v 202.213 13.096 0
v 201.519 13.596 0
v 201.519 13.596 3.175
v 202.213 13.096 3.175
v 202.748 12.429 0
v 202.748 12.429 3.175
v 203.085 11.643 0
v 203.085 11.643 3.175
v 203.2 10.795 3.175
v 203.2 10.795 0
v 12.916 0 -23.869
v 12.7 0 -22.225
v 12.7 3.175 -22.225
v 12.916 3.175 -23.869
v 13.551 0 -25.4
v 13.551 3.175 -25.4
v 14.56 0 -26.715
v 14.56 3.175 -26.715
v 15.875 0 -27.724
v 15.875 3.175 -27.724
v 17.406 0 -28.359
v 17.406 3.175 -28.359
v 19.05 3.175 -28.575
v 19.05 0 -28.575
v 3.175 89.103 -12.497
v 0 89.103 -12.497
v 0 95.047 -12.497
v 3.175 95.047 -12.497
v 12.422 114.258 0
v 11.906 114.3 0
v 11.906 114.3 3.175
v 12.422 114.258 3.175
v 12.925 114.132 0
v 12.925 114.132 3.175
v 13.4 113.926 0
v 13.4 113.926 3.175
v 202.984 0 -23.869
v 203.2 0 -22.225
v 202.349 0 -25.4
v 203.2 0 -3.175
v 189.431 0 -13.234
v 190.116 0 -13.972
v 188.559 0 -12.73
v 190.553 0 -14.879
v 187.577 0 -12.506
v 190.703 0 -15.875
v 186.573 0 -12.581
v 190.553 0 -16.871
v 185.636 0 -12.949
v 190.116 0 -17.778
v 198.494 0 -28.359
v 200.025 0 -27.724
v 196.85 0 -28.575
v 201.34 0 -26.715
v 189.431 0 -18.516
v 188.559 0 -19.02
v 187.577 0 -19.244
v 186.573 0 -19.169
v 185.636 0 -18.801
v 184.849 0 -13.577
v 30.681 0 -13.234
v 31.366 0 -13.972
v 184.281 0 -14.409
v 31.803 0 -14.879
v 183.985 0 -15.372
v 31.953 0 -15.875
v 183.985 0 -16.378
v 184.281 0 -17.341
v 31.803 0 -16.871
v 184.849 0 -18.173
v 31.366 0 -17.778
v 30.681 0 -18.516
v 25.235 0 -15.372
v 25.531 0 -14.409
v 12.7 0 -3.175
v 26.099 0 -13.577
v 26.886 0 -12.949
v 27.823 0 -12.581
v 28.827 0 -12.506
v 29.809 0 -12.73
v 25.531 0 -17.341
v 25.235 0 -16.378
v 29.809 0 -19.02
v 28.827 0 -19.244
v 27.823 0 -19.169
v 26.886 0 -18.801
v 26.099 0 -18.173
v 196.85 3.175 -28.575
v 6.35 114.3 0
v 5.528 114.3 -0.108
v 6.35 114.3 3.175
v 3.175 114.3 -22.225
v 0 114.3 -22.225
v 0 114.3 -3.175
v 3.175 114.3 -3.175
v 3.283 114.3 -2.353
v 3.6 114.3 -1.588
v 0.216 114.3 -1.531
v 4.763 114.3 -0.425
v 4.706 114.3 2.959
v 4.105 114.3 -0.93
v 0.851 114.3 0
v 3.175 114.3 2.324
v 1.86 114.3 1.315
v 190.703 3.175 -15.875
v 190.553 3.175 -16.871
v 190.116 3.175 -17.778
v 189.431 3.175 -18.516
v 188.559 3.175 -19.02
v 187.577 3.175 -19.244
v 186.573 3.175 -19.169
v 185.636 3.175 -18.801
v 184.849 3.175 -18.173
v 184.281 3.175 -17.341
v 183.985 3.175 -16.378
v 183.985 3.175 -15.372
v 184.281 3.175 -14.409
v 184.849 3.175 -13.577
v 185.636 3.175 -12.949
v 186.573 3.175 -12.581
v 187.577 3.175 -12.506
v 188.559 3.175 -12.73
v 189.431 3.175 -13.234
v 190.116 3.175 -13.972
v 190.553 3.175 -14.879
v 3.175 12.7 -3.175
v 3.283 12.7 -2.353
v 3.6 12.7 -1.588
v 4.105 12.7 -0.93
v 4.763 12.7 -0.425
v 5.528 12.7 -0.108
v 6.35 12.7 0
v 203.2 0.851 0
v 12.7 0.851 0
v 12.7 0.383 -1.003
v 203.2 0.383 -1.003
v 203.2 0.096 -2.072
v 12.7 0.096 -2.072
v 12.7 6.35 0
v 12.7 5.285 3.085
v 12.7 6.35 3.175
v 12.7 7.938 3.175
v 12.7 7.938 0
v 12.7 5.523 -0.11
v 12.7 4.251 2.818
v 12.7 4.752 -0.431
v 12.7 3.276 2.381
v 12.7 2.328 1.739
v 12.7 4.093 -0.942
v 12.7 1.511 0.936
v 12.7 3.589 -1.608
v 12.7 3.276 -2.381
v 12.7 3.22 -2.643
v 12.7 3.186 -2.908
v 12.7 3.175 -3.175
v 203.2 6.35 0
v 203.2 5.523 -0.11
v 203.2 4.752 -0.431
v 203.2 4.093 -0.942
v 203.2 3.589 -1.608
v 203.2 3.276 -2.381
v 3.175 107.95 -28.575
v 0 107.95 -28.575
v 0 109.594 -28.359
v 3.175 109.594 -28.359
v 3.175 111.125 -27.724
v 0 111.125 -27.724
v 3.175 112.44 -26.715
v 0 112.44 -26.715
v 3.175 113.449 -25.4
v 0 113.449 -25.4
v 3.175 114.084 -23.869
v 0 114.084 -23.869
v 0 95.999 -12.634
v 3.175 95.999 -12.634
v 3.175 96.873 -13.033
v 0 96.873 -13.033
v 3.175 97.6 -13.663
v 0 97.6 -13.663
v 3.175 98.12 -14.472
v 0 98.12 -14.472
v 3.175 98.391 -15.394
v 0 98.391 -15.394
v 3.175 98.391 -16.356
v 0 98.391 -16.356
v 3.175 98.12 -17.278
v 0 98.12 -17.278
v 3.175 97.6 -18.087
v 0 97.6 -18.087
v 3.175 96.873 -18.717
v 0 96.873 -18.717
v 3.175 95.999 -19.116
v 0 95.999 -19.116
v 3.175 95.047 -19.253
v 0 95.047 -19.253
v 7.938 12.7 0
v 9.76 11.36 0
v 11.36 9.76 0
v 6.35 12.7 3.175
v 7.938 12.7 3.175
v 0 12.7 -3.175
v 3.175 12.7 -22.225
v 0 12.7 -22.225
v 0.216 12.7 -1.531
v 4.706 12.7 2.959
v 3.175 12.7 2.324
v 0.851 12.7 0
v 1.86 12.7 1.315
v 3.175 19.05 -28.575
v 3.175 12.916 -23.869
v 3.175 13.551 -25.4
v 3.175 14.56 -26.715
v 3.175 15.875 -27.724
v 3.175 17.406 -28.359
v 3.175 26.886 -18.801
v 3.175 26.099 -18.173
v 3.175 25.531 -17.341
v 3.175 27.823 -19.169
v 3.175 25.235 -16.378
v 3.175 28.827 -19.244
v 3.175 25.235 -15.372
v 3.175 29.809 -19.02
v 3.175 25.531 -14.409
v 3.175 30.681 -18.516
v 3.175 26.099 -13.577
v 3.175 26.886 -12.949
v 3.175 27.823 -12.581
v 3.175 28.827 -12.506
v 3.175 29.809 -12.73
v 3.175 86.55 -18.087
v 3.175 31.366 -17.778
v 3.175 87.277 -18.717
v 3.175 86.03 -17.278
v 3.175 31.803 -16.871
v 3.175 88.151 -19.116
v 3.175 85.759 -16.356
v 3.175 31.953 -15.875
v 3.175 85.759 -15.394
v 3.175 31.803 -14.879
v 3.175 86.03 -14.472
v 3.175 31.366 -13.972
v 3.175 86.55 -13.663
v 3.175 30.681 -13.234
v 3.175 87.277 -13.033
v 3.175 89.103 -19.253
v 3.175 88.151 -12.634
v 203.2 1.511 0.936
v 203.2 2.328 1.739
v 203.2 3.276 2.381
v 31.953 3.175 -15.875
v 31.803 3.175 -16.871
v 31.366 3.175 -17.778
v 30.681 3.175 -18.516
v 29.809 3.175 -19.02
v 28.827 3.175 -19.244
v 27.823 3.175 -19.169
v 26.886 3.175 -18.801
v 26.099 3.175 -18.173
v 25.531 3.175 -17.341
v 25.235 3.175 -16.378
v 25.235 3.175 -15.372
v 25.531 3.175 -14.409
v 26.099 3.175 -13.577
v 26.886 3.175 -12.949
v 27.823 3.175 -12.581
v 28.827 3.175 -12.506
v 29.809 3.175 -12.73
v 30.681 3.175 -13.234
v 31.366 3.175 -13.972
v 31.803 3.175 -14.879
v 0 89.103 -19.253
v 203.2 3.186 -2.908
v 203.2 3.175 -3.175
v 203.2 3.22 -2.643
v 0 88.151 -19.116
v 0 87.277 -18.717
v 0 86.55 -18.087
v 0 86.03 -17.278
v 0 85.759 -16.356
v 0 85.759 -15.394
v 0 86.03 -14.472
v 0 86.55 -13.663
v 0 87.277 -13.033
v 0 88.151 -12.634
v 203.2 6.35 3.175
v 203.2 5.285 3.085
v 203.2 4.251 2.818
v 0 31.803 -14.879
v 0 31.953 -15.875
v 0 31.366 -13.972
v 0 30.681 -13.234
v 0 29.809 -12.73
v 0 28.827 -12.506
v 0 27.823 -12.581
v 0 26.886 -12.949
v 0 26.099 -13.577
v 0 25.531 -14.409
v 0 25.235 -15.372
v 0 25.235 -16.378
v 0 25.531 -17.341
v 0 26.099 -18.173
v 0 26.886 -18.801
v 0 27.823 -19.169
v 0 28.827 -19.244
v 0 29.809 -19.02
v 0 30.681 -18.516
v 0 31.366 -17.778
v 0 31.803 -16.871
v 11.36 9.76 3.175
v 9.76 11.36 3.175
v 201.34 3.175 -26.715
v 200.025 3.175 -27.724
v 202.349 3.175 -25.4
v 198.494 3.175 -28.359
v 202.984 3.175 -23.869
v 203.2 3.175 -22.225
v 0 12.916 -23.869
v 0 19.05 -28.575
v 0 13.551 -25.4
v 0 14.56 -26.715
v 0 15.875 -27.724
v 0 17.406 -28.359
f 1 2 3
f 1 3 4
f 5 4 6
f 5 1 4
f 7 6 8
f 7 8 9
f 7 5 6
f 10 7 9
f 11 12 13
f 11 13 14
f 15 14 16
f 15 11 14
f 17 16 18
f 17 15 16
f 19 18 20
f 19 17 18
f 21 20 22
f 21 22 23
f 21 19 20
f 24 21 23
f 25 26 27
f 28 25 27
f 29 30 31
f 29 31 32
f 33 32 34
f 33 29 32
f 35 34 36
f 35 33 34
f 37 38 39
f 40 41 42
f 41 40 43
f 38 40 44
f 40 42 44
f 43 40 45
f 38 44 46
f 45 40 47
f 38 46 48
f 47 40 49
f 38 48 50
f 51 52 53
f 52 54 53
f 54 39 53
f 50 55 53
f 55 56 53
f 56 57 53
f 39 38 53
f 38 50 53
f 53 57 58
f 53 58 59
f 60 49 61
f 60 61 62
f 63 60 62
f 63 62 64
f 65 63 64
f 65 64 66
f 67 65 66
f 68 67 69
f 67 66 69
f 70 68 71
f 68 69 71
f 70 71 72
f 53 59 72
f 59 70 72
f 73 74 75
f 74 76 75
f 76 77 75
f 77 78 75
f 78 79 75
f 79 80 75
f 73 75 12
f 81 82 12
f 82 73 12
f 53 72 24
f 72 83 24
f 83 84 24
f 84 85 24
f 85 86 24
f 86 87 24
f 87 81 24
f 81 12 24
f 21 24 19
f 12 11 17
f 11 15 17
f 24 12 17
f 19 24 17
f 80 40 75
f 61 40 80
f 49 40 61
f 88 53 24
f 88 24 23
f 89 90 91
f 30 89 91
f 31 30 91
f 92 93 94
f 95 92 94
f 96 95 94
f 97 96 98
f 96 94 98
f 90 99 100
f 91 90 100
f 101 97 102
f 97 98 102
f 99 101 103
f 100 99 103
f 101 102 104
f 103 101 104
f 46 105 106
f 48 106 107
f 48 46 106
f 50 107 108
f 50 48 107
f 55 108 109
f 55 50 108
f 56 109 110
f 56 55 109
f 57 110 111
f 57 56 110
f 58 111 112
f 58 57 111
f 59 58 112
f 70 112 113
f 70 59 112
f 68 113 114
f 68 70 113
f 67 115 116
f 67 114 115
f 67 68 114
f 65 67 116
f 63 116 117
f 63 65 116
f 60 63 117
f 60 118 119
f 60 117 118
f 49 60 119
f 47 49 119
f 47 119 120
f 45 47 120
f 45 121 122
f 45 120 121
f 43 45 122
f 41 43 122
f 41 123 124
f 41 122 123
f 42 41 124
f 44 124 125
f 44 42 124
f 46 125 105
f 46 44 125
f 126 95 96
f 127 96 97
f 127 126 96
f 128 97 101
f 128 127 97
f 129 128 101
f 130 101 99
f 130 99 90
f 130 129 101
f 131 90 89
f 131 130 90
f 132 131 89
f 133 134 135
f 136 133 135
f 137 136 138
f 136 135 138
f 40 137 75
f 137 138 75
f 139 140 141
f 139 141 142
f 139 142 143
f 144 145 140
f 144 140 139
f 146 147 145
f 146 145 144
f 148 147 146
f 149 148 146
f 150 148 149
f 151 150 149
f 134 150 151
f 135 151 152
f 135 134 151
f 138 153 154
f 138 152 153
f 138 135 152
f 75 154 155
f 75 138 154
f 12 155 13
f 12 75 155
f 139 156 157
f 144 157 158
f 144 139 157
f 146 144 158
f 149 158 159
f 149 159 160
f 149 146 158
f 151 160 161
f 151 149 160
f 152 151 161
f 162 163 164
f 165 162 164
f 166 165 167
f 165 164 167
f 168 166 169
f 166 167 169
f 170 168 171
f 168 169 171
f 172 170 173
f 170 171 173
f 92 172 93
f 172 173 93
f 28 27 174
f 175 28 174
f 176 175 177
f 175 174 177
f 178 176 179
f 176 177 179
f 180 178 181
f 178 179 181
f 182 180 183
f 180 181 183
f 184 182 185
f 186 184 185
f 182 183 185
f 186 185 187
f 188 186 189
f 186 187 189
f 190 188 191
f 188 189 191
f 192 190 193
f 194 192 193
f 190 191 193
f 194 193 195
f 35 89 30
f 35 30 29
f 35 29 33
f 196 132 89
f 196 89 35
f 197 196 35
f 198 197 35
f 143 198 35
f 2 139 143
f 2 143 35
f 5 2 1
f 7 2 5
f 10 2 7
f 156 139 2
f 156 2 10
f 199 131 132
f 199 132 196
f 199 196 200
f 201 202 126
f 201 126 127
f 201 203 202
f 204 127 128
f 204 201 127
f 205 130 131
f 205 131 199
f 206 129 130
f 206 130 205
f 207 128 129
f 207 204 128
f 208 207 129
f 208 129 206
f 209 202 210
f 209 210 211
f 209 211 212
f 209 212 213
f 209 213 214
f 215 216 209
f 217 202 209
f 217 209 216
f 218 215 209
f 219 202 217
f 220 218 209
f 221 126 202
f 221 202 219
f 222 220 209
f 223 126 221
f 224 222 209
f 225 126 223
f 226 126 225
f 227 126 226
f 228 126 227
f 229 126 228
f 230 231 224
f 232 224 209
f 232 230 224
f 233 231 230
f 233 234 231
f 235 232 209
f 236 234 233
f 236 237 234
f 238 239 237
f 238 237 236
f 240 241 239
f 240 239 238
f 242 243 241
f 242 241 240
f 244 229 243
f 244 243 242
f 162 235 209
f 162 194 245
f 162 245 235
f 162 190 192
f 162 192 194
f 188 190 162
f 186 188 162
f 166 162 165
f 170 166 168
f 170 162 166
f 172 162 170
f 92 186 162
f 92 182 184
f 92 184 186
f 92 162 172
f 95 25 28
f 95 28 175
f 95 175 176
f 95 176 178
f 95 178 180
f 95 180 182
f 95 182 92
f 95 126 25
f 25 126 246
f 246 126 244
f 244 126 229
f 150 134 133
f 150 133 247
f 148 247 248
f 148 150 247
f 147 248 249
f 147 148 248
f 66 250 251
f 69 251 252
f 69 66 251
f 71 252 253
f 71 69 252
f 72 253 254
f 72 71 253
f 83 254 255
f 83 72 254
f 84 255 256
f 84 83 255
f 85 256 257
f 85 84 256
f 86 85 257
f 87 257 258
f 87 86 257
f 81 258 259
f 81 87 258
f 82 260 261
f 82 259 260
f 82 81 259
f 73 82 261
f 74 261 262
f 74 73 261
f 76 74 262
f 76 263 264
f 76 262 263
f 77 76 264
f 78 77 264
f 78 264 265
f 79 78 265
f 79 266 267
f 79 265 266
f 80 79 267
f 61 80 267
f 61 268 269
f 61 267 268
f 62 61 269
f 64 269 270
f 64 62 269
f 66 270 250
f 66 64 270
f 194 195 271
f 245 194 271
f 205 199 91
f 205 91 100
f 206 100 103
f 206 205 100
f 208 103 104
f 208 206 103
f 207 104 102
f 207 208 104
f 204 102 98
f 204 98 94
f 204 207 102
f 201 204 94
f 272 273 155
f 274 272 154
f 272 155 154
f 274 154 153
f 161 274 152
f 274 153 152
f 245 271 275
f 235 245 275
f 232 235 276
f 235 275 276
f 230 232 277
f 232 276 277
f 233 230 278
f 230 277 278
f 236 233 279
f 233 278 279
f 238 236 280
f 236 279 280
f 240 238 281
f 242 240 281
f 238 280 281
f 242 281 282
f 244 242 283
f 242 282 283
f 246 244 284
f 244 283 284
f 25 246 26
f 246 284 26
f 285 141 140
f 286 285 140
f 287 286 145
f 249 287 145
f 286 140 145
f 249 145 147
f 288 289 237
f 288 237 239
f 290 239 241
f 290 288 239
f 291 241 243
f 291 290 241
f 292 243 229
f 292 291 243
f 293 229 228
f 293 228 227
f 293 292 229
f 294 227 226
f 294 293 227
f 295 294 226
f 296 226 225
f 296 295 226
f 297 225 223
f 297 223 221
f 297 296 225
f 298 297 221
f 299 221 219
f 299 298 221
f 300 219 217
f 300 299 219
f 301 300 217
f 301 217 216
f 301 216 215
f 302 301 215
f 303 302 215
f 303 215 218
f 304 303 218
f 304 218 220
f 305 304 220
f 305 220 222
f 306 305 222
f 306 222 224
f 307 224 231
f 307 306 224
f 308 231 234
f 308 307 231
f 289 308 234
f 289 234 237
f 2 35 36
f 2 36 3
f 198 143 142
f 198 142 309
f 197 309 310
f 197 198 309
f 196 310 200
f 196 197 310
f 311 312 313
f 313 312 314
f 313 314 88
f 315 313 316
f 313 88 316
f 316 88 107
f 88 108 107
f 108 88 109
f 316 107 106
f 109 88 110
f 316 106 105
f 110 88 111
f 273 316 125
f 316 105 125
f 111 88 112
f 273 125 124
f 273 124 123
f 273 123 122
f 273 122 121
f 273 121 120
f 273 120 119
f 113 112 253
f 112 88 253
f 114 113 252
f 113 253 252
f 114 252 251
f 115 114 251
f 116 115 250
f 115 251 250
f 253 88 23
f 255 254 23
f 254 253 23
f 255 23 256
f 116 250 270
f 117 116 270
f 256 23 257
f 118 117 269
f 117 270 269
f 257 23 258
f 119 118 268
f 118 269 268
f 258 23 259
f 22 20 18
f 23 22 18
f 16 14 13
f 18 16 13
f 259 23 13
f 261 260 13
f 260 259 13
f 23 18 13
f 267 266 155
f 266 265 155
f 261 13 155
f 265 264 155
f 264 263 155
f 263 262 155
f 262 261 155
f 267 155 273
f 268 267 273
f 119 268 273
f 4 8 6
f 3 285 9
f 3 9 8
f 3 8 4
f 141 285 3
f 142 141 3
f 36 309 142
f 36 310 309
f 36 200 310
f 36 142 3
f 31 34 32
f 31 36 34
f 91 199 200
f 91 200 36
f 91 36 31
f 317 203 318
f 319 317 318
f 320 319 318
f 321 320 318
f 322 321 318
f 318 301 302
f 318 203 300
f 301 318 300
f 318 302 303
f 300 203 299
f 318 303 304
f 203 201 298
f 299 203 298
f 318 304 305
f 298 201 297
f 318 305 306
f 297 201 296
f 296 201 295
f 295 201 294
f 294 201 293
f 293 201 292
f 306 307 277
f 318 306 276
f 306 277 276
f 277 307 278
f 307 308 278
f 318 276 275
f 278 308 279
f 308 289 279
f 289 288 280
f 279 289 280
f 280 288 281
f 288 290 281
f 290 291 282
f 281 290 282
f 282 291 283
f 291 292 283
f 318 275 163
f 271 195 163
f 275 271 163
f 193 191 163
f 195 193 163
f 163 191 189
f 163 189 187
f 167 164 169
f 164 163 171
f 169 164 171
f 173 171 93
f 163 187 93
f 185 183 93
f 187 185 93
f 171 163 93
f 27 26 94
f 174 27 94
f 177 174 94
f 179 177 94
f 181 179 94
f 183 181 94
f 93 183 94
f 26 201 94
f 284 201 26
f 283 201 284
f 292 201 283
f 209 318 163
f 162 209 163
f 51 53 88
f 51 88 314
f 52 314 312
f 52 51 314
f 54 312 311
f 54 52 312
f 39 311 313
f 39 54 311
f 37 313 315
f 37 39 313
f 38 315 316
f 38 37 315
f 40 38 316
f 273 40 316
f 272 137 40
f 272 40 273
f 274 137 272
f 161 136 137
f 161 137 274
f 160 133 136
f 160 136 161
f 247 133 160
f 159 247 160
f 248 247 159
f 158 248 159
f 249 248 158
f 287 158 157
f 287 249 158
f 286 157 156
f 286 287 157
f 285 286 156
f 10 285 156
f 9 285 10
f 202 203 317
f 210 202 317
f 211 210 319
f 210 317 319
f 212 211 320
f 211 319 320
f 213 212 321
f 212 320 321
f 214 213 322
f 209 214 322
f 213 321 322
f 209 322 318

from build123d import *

# Parameters (mm, degrees)
BASE_FLANGE1_DEPTH                = 3.175
EDGE_FLANGE2_STRIP_W              = 19.05
EDGE_FLANGE2_STRIP_H              = 3.175
EDGE_FLANGE2_STRIP_CUT_DEPTH      = 190.5
EDGE_FLANGE2_RELIEF_W             = 20.6375
EDGE_FLANGE2_RELIEF_H             = 1.5875
EDGE_FLANGE2_RELIEF_CUT_DEPTH     = 3.175
EDGE_FLANGE2_STRIP_2_W            = 19.05
EDGE_FLANGE2_STRIP_2_H            = 3.175
EDGE_FLANGE2_STRIP_CUT_2_DEPTH    = 101.6
EDGE_FLANGE2_RELIEF_2_W           = 20.6375
EDGE_FLANGE2_RELIEF_2_H           = 1.5875
EDGE_FLANGE2_RELIEF_CUT_2_DEPTH   = 3.175
EDGE_FLANGE2_DEPTH                = 190.5
EDGE_FLANGE2_BEND_DEPTH           = 101.6
F_1_4_CLEARANCE_HOLE1_D           = 6.7564
F_1_4_CLEARANCE_HOLE1_ON_FACE_2_D = 6.7564
CUT_EXTRUDE1_DEPTH                = 235.885633075
FILLET1_R                         = 3.175
FILLET2_R                         = 6.35
F_1_4_START                       = -1
F_1_4_CLEARANCE_SLOT1_DEPTH       = 5
BODY_MOVE_COPY1_OUTLINE_R         = 3.3782
BODY_MOVE_COPY1_DEPTH             = 203.2
BODY_MOVE_COPY1_START             = 12.7
BODY_MOVE_COPY1_2_DEPTH           = 190.5
BODY_MOVE_COPY1_3_OUTLINE_R       = 3.3782
BODY_MOVE_COPY1_3_DEPTH           = 3.175
BODY_MOVE_COPY1_START_2           = 3.175
BODY_MOVE_COPY1_4_OUTLINE_W       = 101.6
BODY_MOVE_COPY1_4_OUTLINE_H       = 6.35
BODY_MOVE_COPY1_4_DEPTH           = 9.525
BODY_MOVE_COPY1_START_3           = 7.9375
BODY_MOVE_COPY1_5_DEPTH           = 4.7625
BODY_MOVE_COPY1_START_4           = 6.35
BODY_MOVE_COPY1_6_DEPTH           = 107.95
BODY_MOVE_COPY1_7_OUTLINE_W       = 4.7625
BODY_MOVE_COPY1_7_OUTLINE_H       = 6.35
BODY_MOVE_COPY1_7_OUTLINE_R       = 3.3782
BODY_MOVE_COPY1_7_DEPTH           = 7.9375
BODY_MOVE_COPY1_8_DEPTH           = 3.175
BODY_MOVE_COPY1_START_5           = -1
BODY_MOVE_COPY1_9_DEPTH           = 7.35
BODY_MOVE_COPY1_10_DEPTH          = 190.5


with BuildPart() as part:
    # Base-Flange1: sheet metal written as solids
    # Sketch3 → Base-Flange1 (new body)
    with BuildSketch(Plane.XY):
        with BuildLine():
            Line((0, 12.7), (0, 114.3))
            Line((0, 114.3), (12.7, 114.3))
            Line((12.7, 114.3), (203.2, 12.7))
            Line((203.2, 12.7), (203.2, 0))
            Line((203.2, 0), (12.7, 0))
            ThreePointArc((12.7, 0), (8.980256121, 8.980256121), (0, 12.7))
        make_face()
    extrude(amount=-BASE_FLANGE1_DEPTH)

    # Edge-Flange2: sheet metal written as solids
    # Edge-Flange2 strip (on a plane across the edge) → Edge-Flange2 strip cut (cut)
    with BuildSketch(Plane.YZ.offset(12.7)):
        with Locations((-3.175, -1.5875)):
            Rectangle(EDGE_FLANGE2_STRIP_W, EDGE_FLANGE2_STRIP_H)
    extrude(amount=EDGE_FLANGE2_STRIP_CUT_DEPTH, mode=Mode.SUBTRACT)

    # Edge-Flange2 relief (on the sheet) → Edge-Flange2 relief cut (cut)
    with BuildSketch(Plane(origin=(12.7, 6.35, 0), x_dir=(0, 1, 0), z_dir=(0, 0, 1))):
        with Locations((-8.73125, 0.79375)):
            Rectangle(EDGE_FLANGE2_RELIEF_W, EDGE_FLANGE2_RELIEF_H)
    extrude(amount=-EDGE_FLANGE2_RELIEF_CUT_DEPTH, mode=Mode.SUBTRACT)

    # Edge-Flange2 strip 2 (on a plane across the edge) → Edge-Flange2 strip cut 2 (cut)
    with BuildSketch(Plane.XZ.offset(-114.3)):
        with Locations((-3.175, -1.5875)):
            Rectangle(EDGE_FLANGE2_STRIP_2_W, EDGE_FLANGE2_STRIP_2_H)
    extrude(amount=EDGE_FLANGE2_STRIP_CUT_2_DEPTH, mode=Mode.SUBTRACT)

    # Edge-Flange2 relief 2 (on the sheet) → Edge-Flange2 relief cut 2 (cut)
    with BuildSketch(Plane(origin=(6.35, 114.3, 0), x_dir=(1, 0, 0), z_dir=(0, 0, 1))):
        with Locations((-8.73125, -102.39375)):
            Rectangle(EDGE_FLANGE2_RELIEF_2_W, EDGE_FLANGE2_RELIEF_2_H)
    extrude(amount=-EDGE_FLANGE2_RELIEF_CUT_2_DEPTH, mode=Mode.SUBTRACT)

    # Edge-Flange2 section (on a plane across the edge) → Edge-Flange2 (add)
    with BuildSketch(Plane.YZ.offset(12.7)):
        with BuildLine():
            Line((0, 3.175), (0, 28.575))
            Line((0, 28.575), (3.175, 28.575))
            Line((3.175, 28.575), (3.175, 3.175))
            ThreePointArc((3.175, 3.175), (4.10493597, 0.92993597), (6.35, 0))
            Line((6.35, 0), (6.35, -3.175))
            ThreePointArc((6.35, -3.175), (1.859871939, -1.315128061), (0, 3.175))
        make_face()
    extrude(amount=EDGE_FLANGE2_DEPTH)

    # Edge-Flange2 section 2 (on a plane across the edge) → Edge-Flange2 bend (add)
    with BuildSketch(Plane.XZ.offset(-114.3)):
        with BuildLine():
            Line((0, 3.175), (0, 28.575))
            Line((0, 28.575), (3.175, 28.575))
            Line((3.175, 28.575), (3.175, 3.175))
            ThreePointArc((3.175, 3.175), (4.10493597, 0.92993597), (6.35, 0))
            Line((6.35, 0), (6.35, -3.175))
            ThreePointArc((6.35, -3.175), (1.859871939, -1.315128061), (0, 3.175))
        make_face()
    extrude(amount=EDGE_FLANGE2_BEND_DEPTH)

    # 1/4 Clearance Hole1 (through all)
    with Locations(Plane(origin=(3.175, 28.575, 15.875), x_dir=(0, 0, 1), z_dir=(1, 0, 0))):
        with Locations((0, 0), (0, -63.5)):
            Hole(F_1_4_CLEARANCE_HOLE1_D / 2)

    # 1/4 Clearance Hole1 on face 2 (through all)
    with Locations(Plane(origin=(28.575, 3.175, 15.875), x_dir=(0, 0, 1), z_dir=(0, 1, 0))):
        with Locations((0, 0), (0, 158.75)):
            Hole(F_1_4_CLEARANCE_HOLE1_ON_FACE_2_D / 2)

    # Sketch27 → Cut-Extrude1 (cut, through all)
    with BuildSketch(Plane.XY):
        with BuildLine():
            Line((7.9375, 12.7), (0, 12.7))
            Line((0, 12.7), (0, 0))
            Line((0, 0), (12.7, 0))
            Line((12.7, 0), (12.7, 7.9375))
            ThreePointArc((12.7, 7.9375), (10.589945851, 10.589945851), (7.9375, 12.7))
        make_face()
    extrude(amount=-CUT_EXTRUDE1_DEPTH, mode=Mode.SUBTRACT)

    # Fillet1
    fillet1_edges = [part.edges().sort_by_distance(p)[0] for p in [
        (12.7, 114.3, -1.5875),
        (203.2, 12.7, -1.5875),
    ]]
    fillet(fillet1_edges, radius=FILLET1_R)

    # Fillet2
    fillet2_edges = [part.edges().sort_by_distance(p)[0] for p in [
        (12.7, 1.5875, 28.575),
        (203.2, 1.5875, 28.575),
        (1.5875, 114.3, 28.575),
        (1.5875, 12.7, 28.575),
    ]]
    fillet(fillet2_edges, radius=FILLET2_R)

    # 1/4 Clearance Slot1: read off the stored shape, not the designer's step
    # 1/4 Clearance Slot1 outline → 1/4 Clearance Slot1 (cut)
    with BuildSketch(Plane.YZ.offset(F_1_4_START)):
        with BuildLine():
            ThreePointArc((95.0468, 12.4968), (98.425, 15.875), (95.0468, 19.2532))
            Line((95.0468, 19.2532), (92.075, 19.2532))
            ThreePointArc((92.075, 19.2532), (95.4532, 15.875), (92.075, 12.4968))
            Line((92.075, 12.4968), (95.0468, 12.4968))
        make_face()
        with BuildLine():
            ThreePointArc((92.075, 12.4968), (88.6968, 15.875), (92.075, 19.2532))
            Line((92.075, 19.2532), (89.1032, 19.2532))
            ThreePointArc((89.1032, 19.2532), (85.725, 15.875), (89.1032, 12.4968))
            Line((89.1032, 12.4968), (92.075, 12.4968))
        make_face()
    extrude(amount=F_1_4_CLEARANCE_SLOT1_DEPTH, mode=Mode.SUBTRACT)

    # Body-Move/Copy1: read off the stored shape, not the designer's step
    # Body-Move/Copy1 outline → Body-Move/Copy1 (cut)
    # profile 1 of 2: a face of its own
    with BuildSketch(Plane.YZ):
        with BuildLine():
            Line((12.7, 3.175), (114.3, 3.175))
            Line((114.3, 3.175), (114.3, 22.225))
            ThreePointArc((114.3, 22.225), (112.440128061, 26.715128061), (107.95, 28.575))
            Line((107.95, 28.575), (19.05, 28.575))
            ThreePointArc((19.05, 28.575), (14.559871939, 26.715128061), (12.7, 22.225))
            Line((12.7, 22.225), (12.7, 3.175))
        make_face()
        with Locations((28.575, 15.875)):
            Circle(BODY_MOVE_COPY1_OUTLINE_R, mode=Mode.SUBTRACT)
        with BuildLine():
            Line((89.1032, 19.2532), (95.0468, 19.2532))
            ThreePointArc((95.0468, 19.2532), (98.425, 15.875), (95.0468, 12.4968))
            Line((95.0468, 12.4968), (89.1032, 12.4968))
            ThreePointArc((89.1032, 12.4968), (85.725, 15.875), (89.1032, 19.2532))
        make_face(mode=Mode.SUBTRACT)
    # profile 2 of 2: a face of its own
    with BuildSketch(Plane.YZ):
        with BuildLine():
            ThreePointArc((0.850738685, 0), (1.90100414, 1.355886872), (3.275819469, 2.381250001))
            ThreePointArc((3.275819469, 2.381250001), (3.200305714, 2.774936372), (3.175, 3.175))
            Line((3.175, 3.175), (3.175, 28.575))
            Line((3.175, 28.575), (0, 28.575))
            Line((0, 28.575), (0, 3.175))
            ThreePointArc((0, 3.175), (0.216371003, 1.531499064), (0.850738685, 0))
        make_face()
    extrude(amount=BODY_MOVE_COPY1_DEPTH, mode=Mode.SUBTRACT)

    # Body-Move_Copy1 2 outline → Body-Move_Copy1 2 (add)
    with BuildSketch(Plane.YZ.offset(BODY_MOVE_COPY1_START)):
        with BuildLine():
            Line((114.3, 3.175), (6.35, 3.175))
            ThreePointArc((6.35, 3.175), (4.7625, 2.973361062), (3.275819469, 2.381250001))
            ThreePointArc((3.275819469, 2.381250001), (4.405717517, 0.664942108), (6.35, 0))
            ThreePointArc((6.35, 0), (4.405717517, -0.664942108), (3.275819469, -2.381250001))
            ThreePointArc((3.275819469, -2.381250001), (4.7625, -2.973361062), (6.35, -3.175))
            Line((6.35, -3.175), (114.3, -3.175))
            Line((114.3, -3.175), (114.3, 3.175))
        make_face()
        with BuildLine():
            ThreePointArc((3.275819469, -2.381250001), (1.90100414, -1.355886872), (0.850738685, 0))
            ThreePointArc((0.850738685, 0), (0.216371003, -1.531499064), (0, -3.175))
            Line((0, -3.175), (0, -28.575))
            Line((0, -28.575), (3.175, -28.575))
            Line((3.175, -28.575), (3.175, -3.175))
            ThreePointArc((3.175, -3.175), (3.200305714, -2.774936372), (3.275819469, -2.381250001))
        make_face()
    extrude(amount=BODY_MOVE_COPY1_2_DEPTH)

    # Body-Move_Copy1 3 outline → Body-Move_Copy1 3 (add)
    with BuildSketch(Plane.YZ):
        with BuildLine():
            Line((114.3, 3.175), (12.7, 3.175))
            Line((12.7, 3.175), (12.7, -22.225))
            ThreePointArc((12.7, -22.225), (14.559871939, -26.715128061), (19.05, -28.575))
            Line((19.05, -28.575), (107.95, -28.575))
            ThreePointArc((107.95, -28.575), (112.440128061, -26.715128061), (114.3, -22.225))
            Line((114.3, -22.225), (114.3, 3.175))
        make_face()
        with BuildLine():
            ThreePointArc((89.1032, -19.2532), (85.725, -15.875), (89.1032, -12.4968))
            Line((89.1032, -12.4968), (95.0468, -12.4968))
            ThreePointArc((95.0468, -12.4968), (98.425, -15.875), (95.0468, -19.2532))
            Line((95.0468, -19.2532), (89.1032, -19.2532))
        make_face(mode=Mode.SUBTRACT)
        with Locations((28.575, -15.875)):
            Circle(BODY_MOVE_COPY1_3_OUTLINE_R, mode=Mode.SUBTRACT)
    extrude(amount=BODY_MOVE_COPY1_3_DEPTH)

    # Body-Move_Copy1 4 outline → Body-Move_Copy1 4 (add)
    with BuildSketch(Plane.YZ.offset(BODY_MOVE_COPY1_START_2)):
        with Locations((63.5, 0)):
            Rectangle(BODY_MOVE_COPY1_4_OUTLINE_W, BODY_MOVE_COPY1_4_OUTLINE_H)
    extrude(amount=BODY_MOVE_COPY1_4_DEPTH)

    # Body-Move_Copy1 5 outline → Body-Move_Copy1 5 (add)
    with BuildSketch(Plane.YZ.offset(BODY_MOVE_COPY1_START_3)):
        with BuildLine():
            Line((12.7, -3.175), (12.7, 3.175))
            Line((12.7, 3.175), (6.35, 3.175))
            ThreePointArc((6.35, 3.175), (4.7625, 2.973361062), (3.275819469, 2.381250001))
            ThreePointArc((3.275819469, 2.381250001), (4.405717517, 0.664942108), (6.35, 0))
            ThreePointArc((6.35, 0), (4.405717517, -0.664942108), (3.275819469, -2.381250001))
            ThreePointArc((3.275819469, -2.381250001), (4.7625, -2.973361062), (6.35, -3.175))
            Line((6.35, -3.175), (12.7, -3.175))
        make_face()
    extrude(amount=BODY_MOVE_COPY1_5_DEPTH)

    # Body-Move_Copy1 6 outline → Body-Move_Copy1 6 (cut)
    with BuildSketch(Plane(origin=(0, 0, 0), x_dir=(1, 0, 0), z_dir=(0, 1, 0)).offset(BODY_MOVE_COPY1_START_4)):
        with BuildLine():
            Line((203.2, 3.175), (3.175, 3.175))
            ThreePointArc((3.175, 3.175), (4.10493597, 0.92993597), (6.35, 0))
            Line((6.35, 0), (203.2, 0))
            Line((203.2, 0), (203.2, 3.175))
        make_face()
        with BuildLine():
            Line((0, -3.175), (6.35, -3.175))
            ThreePointArc((6.35, -3.175), (1.859871939, -1.315128061), (0, 3.175))
            Line((0, 3.175), (0, -3.175))
        make_face()
    extrude(amount=BODY_MOVE_COPY1_6_DEPTH, mode=Mode.SUBTRACT)

    # Body-Move_Copy1 7 outline → Body-Move_Copy1 7 (cut)
    with BuildSketch(Plane(origin=(0, 0, 0), x_dir=(1, 0, 0), z_dir=(0, 1, 0))):
        with Locations((10.31875, 0)):
            Rectangle(BODY_MOVE_COPY1_7_OUTLINE_W, BODY_MOVE_COPY1_7_OUTLINE_H)
        with Locations((187.325, 15.875)):
            Circle(BODY_MOVE_COPY1_7_OUTLINE_R)
        with Locations((28.575, 15.875)):
            Circle(BODY_MOVE_COPY1_7_OUTLINE_R)
    extrude(amount=BODY_MOVE_COPY1_7_DEPTH, mode=Mode.SUBTRACT)

    # Body-Move_Copy1 8 outline → Body-Move_Copy1 8 (cut)
    with BuildSketch(Plane.XY):
        with BuildLine():
            Line((13.400367647, 113.926470588), (201.519117647, 13.596470588))
            ThreePointArc((201.519117647, 13.596470588), (202.747540039, 12.428524023), (203.2, 10.795))
            Line((203.2, 10.795), (203.2, 114.3))
            Line((203.2, 114.3), (11.90625, 114.3))
            ThreePointArc((11.90625, 114.3), (12.676300609, 114.205202438), (13.400367647, 113.926470588))
        make_face()
        with BuildLine():
            Line((7.9375, 7.9375), (12.7, 7.9375))
            ThreePointArc((12.7, 7.9375), (10.589945851, 10.589945851), (7.9375, 12.7))
            Line((7.9375, 12.7), (7.9375, 7.9375))
        make_face()
    extrude(amount=BODY_MOVE_COPY1_8_DEPTH, mode=Mode.SUBTRACT)

    # Body-Move_Copy1 9 outline → Body-Move_Copy1 9 (cut)
    with BuildSketch(Plane(origin=(0, 0, 0), x_dir=(1, 0, 0), z_dir=(0, 1, 0)).offset(BODY_MOVE_COPY1_START_5)):
        with BuildLine():
            ThreePointArc((196.85, 28.575), (201.340128061, 26.715128061), (203.2, 22.225))
            Line((203.2, 22.225), (203.2, 28.575))
            Line((203.2, 28.575), (196.85, 28.575))
        make_face()
        with BuildLine():
            ThreePointArc((12.7, 22.225), (14.559871939, 26.715128061), (19.05, 28.575))
            Line((19.05, 28.575), (12.7, 28.575))
            Line((12.7, 28.575), (12.7, 22.225))
        make_face()
    extrude(amount=BODY_MOVE_COPY1_9_DEPTH, mode=Mode.SUBTRACT)

    # Body-Move_Copy1 10 outline → Body-Move_Copy1 10 (cut)
    with BuildSketch(Plane.YZ.offset(BODY_MOVE_COPY1_START)):
        with BuildLine():
            ThreePointArc((6.35, 0), (4.405717517, -0.664942108), (3.275819469, -2.381250001))
            ThreePointArc((3.275819469, -2.381250001), (4.7625, -2.973361062), (6.35, -3.175))
            Line((6.35, -3.175), (6.35, 0))
        make_face()
    extrude(amount=BODY_MOVE_COPY1_10_DEPTH, mode=Mode.SUBTRACT)


solid = part.part
